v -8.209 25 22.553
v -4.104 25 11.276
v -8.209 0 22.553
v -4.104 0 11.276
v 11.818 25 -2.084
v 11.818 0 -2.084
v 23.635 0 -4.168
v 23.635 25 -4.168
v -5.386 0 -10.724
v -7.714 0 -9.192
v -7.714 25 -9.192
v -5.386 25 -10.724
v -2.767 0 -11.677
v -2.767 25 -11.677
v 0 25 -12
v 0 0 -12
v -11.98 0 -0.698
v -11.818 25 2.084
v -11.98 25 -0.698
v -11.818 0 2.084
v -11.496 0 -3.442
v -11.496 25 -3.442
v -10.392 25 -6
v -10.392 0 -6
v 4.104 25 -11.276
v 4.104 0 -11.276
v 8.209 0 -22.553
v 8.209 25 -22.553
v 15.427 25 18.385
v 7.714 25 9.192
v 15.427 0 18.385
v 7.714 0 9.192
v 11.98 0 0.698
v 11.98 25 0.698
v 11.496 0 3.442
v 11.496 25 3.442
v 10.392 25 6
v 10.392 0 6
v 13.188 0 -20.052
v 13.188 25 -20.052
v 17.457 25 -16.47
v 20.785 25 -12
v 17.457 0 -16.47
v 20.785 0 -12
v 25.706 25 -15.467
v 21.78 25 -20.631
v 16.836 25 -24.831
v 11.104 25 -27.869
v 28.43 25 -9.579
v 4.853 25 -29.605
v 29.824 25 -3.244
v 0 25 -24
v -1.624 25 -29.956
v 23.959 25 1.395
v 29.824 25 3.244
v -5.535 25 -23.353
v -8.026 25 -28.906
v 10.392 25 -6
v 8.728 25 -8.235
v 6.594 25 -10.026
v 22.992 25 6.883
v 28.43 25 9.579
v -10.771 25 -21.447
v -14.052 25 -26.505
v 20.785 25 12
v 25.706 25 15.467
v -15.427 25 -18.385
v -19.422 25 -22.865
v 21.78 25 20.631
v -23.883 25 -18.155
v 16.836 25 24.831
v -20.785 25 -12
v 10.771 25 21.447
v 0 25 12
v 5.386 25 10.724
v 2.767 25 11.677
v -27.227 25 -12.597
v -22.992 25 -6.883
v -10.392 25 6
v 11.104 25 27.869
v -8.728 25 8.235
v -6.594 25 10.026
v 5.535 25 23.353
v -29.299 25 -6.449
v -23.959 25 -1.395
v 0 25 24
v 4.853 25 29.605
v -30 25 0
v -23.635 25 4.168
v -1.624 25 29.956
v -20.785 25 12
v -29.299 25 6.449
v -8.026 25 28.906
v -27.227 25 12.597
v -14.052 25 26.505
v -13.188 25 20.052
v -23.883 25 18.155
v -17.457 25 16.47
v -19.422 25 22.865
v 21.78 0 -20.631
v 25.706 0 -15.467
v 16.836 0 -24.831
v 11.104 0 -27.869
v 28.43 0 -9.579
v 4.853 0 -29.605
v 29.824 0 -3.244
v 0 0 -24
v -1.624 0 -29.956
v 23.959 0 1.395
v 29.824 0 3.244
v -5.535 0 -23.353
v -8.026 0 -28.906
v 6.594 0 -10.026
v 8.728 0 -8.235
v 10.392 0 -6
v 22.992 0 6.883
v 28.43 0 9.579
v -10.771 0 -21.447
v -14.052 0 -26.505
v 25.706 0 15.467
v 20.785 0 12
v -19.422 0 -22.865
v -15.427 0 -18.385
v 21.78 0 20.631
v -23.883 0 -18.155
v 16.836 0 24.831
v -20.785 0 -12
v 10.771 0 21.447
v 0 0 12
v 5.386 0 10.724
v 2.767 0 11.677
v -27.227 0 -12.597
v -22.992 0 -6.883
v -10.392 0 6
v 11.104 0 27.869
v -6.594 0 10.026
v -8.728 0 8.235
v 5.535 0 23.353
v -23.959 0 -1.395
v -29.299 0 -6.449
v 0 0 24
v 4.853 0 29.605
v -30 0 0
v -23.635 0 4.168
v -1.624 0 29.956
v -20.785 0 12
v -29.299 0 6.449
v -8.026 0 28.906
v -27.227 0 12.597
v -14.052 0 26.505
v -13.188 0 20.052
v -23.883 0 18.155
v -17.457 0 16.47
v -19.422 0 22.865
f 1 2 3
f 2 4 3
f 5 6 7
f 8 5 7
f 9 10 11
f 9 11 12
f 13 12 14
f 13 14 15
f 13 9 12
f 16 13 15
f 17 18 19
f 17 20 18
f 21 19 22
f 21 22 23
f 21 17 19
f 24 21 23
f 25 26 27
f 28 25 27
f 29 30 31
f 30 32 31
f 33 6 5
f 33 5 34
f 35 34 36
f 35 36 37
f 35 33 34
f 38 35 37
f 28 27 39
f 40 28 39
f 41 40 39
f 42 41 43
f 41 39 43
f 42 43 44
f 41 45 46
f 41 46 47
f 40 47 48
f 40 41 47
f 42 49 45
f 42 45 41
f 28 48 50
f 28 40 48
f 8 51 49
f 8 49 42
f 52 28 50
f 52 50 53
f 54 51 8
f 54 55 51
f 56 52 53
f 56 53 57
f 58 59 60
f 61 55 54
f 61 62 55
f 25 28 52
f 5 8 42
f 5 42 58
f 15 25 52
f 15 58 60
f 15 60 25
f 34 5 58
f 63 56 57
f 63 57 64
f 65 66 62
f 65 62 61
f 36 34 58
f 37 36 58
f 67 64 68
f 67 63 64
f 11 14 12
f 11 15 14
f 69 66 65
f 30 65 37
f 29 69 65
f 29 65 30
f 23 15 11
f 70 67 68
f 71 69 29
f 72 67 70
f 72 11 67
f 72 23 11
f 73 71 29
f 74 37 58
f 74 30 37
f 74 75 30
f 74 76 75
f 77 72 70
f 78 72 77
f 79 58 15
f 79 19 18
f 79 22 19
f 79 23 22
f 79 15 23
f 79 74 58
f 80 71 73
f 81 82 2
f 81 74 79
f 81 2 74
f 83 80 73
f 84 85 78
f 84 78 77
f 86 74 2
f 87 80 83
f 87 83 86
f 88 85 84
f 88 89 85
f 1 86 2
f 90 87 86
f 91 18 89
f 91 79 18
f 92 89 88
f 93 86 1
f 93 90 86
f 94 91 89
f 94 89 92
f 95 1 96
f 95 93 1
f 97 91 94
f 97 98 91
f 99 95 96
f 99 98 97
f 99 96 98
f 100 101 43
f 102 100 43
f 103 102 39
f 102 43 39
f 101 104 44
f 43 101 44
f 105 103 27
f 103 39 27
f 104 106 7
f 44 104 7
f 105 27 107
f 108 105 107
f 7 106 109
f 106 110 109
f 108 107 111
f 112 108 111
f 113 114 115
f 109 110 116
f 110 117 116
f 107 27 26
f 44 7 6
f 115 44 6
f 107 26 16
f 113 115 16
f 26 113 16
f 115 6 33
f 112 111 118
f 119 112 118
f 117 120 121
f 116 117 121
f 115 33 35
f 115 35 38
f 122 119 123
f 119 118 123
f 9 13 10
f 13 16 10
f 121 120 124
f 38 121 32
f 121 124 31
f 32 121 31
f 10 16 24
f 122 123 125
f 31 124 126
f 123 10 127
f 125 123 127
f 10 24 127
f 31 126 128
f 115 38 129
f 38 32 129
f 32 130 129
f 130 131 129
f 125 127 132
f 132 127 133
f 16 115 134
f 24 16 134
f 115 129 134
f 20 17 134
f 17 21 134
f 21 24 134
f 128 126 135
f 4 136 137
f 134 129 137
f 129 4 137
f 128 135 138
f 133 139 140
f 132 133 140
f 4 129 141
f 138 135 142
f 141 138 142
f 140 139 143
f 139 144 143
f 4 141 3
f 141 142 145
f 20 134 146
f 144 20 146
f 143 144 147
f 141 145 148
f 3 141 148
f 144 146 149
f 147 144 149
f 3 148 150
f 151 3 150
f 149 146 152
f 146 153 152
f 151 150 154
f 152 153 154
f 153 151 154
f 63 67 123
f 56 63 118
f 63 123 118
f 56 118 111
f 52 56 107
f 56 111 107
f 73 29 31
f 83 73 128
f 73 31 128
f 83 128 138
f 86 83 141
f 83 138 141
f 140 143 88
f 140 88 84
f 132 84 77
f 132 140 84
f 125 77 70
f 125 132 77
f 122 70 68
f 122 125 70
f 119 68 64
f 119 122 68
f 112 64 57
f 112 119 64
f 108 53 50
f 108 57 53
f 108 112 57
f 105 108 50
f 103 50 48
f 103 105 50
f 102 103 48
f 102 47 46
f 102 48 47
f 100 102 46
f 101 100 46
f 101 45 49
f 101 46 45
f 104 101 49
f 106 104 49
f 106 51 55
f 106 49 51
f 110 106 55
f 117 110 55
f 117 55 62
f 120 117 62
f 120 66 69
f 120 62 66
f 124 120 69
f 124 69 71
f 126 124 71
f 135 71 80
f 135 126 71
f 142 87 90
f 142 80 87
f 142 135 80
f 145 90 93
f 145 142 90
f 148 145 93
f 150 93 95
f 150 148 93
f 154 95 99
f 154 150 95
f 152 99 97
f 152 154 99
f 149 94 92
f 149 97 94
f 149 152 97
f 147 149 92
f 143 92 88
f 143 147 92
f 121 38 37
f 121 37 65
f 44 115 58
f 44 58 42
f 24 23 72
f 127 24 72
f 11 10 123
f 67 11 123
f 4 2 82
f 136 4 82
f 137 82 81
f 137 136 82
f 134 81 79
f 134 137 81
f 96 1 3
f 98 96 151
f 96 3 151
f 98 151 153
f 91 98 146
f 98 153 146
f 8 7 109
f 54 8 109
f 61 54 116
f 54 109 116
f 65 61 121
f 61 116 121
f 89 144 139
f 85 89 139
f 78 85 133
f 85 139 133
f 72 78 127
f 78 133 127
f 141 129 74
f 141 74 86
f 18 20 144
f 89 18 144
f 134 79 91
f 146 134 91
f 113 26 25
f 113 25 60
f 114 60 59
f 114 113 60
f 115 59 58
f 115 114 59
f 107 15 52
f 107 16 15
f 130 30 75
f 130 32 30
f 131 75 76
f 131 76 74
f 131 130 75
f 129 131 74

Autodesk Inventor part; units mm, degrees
ref_plane "YZ Plane" through (0, 0, 0) normal (1, 0, 0) x (0, 1, 0)
ref_plane "XZ Plane" through (0, 0, 0) normal (0, 1, 0) x (-1, 0, 0)
ref_plane "XY Plane" through (0, 0, 0) normal (0, 0, 1) x (1, 0, 0)
sketch "Sketch1" plane through (0, 0, 0) normal (0, 1, 0) x (-1, 0, 0)
  circle A0 centre (0, 0) radius 30
  dimension "d0" = 60
extrude "Extrusion1" add sketch "Sketch1" along normal blind 25
sketch "Sketch2" plane through (0, 0, 0) normal (0, -1, 0) x (1, 0, 0)
  line L0 (0, 0) -> (0, 24)
  arc A0 (15.4269, 18.3851) -> (0, 24) centre (0, 0) ccw
  arc A1 (7.7135, 9.1925) -> (0, 12) centre (0, 0) ccw
  line L1 (0, 0) -> (15.4269, 18.3851)
  dimension "d3" = 40
  dimension "d4" = 12
  dimension "d5" = 24
extrude "Extrusion2" cut sketch "Sketch2" against normal through all contours L0 A0 L1 A1
pattern_circular "Circular Pattern1" count 6 over 360 about axis through (0, 0, 0) along (0, 1, 0) of "Extrusion2"
properties part number "Small Flywheel"
